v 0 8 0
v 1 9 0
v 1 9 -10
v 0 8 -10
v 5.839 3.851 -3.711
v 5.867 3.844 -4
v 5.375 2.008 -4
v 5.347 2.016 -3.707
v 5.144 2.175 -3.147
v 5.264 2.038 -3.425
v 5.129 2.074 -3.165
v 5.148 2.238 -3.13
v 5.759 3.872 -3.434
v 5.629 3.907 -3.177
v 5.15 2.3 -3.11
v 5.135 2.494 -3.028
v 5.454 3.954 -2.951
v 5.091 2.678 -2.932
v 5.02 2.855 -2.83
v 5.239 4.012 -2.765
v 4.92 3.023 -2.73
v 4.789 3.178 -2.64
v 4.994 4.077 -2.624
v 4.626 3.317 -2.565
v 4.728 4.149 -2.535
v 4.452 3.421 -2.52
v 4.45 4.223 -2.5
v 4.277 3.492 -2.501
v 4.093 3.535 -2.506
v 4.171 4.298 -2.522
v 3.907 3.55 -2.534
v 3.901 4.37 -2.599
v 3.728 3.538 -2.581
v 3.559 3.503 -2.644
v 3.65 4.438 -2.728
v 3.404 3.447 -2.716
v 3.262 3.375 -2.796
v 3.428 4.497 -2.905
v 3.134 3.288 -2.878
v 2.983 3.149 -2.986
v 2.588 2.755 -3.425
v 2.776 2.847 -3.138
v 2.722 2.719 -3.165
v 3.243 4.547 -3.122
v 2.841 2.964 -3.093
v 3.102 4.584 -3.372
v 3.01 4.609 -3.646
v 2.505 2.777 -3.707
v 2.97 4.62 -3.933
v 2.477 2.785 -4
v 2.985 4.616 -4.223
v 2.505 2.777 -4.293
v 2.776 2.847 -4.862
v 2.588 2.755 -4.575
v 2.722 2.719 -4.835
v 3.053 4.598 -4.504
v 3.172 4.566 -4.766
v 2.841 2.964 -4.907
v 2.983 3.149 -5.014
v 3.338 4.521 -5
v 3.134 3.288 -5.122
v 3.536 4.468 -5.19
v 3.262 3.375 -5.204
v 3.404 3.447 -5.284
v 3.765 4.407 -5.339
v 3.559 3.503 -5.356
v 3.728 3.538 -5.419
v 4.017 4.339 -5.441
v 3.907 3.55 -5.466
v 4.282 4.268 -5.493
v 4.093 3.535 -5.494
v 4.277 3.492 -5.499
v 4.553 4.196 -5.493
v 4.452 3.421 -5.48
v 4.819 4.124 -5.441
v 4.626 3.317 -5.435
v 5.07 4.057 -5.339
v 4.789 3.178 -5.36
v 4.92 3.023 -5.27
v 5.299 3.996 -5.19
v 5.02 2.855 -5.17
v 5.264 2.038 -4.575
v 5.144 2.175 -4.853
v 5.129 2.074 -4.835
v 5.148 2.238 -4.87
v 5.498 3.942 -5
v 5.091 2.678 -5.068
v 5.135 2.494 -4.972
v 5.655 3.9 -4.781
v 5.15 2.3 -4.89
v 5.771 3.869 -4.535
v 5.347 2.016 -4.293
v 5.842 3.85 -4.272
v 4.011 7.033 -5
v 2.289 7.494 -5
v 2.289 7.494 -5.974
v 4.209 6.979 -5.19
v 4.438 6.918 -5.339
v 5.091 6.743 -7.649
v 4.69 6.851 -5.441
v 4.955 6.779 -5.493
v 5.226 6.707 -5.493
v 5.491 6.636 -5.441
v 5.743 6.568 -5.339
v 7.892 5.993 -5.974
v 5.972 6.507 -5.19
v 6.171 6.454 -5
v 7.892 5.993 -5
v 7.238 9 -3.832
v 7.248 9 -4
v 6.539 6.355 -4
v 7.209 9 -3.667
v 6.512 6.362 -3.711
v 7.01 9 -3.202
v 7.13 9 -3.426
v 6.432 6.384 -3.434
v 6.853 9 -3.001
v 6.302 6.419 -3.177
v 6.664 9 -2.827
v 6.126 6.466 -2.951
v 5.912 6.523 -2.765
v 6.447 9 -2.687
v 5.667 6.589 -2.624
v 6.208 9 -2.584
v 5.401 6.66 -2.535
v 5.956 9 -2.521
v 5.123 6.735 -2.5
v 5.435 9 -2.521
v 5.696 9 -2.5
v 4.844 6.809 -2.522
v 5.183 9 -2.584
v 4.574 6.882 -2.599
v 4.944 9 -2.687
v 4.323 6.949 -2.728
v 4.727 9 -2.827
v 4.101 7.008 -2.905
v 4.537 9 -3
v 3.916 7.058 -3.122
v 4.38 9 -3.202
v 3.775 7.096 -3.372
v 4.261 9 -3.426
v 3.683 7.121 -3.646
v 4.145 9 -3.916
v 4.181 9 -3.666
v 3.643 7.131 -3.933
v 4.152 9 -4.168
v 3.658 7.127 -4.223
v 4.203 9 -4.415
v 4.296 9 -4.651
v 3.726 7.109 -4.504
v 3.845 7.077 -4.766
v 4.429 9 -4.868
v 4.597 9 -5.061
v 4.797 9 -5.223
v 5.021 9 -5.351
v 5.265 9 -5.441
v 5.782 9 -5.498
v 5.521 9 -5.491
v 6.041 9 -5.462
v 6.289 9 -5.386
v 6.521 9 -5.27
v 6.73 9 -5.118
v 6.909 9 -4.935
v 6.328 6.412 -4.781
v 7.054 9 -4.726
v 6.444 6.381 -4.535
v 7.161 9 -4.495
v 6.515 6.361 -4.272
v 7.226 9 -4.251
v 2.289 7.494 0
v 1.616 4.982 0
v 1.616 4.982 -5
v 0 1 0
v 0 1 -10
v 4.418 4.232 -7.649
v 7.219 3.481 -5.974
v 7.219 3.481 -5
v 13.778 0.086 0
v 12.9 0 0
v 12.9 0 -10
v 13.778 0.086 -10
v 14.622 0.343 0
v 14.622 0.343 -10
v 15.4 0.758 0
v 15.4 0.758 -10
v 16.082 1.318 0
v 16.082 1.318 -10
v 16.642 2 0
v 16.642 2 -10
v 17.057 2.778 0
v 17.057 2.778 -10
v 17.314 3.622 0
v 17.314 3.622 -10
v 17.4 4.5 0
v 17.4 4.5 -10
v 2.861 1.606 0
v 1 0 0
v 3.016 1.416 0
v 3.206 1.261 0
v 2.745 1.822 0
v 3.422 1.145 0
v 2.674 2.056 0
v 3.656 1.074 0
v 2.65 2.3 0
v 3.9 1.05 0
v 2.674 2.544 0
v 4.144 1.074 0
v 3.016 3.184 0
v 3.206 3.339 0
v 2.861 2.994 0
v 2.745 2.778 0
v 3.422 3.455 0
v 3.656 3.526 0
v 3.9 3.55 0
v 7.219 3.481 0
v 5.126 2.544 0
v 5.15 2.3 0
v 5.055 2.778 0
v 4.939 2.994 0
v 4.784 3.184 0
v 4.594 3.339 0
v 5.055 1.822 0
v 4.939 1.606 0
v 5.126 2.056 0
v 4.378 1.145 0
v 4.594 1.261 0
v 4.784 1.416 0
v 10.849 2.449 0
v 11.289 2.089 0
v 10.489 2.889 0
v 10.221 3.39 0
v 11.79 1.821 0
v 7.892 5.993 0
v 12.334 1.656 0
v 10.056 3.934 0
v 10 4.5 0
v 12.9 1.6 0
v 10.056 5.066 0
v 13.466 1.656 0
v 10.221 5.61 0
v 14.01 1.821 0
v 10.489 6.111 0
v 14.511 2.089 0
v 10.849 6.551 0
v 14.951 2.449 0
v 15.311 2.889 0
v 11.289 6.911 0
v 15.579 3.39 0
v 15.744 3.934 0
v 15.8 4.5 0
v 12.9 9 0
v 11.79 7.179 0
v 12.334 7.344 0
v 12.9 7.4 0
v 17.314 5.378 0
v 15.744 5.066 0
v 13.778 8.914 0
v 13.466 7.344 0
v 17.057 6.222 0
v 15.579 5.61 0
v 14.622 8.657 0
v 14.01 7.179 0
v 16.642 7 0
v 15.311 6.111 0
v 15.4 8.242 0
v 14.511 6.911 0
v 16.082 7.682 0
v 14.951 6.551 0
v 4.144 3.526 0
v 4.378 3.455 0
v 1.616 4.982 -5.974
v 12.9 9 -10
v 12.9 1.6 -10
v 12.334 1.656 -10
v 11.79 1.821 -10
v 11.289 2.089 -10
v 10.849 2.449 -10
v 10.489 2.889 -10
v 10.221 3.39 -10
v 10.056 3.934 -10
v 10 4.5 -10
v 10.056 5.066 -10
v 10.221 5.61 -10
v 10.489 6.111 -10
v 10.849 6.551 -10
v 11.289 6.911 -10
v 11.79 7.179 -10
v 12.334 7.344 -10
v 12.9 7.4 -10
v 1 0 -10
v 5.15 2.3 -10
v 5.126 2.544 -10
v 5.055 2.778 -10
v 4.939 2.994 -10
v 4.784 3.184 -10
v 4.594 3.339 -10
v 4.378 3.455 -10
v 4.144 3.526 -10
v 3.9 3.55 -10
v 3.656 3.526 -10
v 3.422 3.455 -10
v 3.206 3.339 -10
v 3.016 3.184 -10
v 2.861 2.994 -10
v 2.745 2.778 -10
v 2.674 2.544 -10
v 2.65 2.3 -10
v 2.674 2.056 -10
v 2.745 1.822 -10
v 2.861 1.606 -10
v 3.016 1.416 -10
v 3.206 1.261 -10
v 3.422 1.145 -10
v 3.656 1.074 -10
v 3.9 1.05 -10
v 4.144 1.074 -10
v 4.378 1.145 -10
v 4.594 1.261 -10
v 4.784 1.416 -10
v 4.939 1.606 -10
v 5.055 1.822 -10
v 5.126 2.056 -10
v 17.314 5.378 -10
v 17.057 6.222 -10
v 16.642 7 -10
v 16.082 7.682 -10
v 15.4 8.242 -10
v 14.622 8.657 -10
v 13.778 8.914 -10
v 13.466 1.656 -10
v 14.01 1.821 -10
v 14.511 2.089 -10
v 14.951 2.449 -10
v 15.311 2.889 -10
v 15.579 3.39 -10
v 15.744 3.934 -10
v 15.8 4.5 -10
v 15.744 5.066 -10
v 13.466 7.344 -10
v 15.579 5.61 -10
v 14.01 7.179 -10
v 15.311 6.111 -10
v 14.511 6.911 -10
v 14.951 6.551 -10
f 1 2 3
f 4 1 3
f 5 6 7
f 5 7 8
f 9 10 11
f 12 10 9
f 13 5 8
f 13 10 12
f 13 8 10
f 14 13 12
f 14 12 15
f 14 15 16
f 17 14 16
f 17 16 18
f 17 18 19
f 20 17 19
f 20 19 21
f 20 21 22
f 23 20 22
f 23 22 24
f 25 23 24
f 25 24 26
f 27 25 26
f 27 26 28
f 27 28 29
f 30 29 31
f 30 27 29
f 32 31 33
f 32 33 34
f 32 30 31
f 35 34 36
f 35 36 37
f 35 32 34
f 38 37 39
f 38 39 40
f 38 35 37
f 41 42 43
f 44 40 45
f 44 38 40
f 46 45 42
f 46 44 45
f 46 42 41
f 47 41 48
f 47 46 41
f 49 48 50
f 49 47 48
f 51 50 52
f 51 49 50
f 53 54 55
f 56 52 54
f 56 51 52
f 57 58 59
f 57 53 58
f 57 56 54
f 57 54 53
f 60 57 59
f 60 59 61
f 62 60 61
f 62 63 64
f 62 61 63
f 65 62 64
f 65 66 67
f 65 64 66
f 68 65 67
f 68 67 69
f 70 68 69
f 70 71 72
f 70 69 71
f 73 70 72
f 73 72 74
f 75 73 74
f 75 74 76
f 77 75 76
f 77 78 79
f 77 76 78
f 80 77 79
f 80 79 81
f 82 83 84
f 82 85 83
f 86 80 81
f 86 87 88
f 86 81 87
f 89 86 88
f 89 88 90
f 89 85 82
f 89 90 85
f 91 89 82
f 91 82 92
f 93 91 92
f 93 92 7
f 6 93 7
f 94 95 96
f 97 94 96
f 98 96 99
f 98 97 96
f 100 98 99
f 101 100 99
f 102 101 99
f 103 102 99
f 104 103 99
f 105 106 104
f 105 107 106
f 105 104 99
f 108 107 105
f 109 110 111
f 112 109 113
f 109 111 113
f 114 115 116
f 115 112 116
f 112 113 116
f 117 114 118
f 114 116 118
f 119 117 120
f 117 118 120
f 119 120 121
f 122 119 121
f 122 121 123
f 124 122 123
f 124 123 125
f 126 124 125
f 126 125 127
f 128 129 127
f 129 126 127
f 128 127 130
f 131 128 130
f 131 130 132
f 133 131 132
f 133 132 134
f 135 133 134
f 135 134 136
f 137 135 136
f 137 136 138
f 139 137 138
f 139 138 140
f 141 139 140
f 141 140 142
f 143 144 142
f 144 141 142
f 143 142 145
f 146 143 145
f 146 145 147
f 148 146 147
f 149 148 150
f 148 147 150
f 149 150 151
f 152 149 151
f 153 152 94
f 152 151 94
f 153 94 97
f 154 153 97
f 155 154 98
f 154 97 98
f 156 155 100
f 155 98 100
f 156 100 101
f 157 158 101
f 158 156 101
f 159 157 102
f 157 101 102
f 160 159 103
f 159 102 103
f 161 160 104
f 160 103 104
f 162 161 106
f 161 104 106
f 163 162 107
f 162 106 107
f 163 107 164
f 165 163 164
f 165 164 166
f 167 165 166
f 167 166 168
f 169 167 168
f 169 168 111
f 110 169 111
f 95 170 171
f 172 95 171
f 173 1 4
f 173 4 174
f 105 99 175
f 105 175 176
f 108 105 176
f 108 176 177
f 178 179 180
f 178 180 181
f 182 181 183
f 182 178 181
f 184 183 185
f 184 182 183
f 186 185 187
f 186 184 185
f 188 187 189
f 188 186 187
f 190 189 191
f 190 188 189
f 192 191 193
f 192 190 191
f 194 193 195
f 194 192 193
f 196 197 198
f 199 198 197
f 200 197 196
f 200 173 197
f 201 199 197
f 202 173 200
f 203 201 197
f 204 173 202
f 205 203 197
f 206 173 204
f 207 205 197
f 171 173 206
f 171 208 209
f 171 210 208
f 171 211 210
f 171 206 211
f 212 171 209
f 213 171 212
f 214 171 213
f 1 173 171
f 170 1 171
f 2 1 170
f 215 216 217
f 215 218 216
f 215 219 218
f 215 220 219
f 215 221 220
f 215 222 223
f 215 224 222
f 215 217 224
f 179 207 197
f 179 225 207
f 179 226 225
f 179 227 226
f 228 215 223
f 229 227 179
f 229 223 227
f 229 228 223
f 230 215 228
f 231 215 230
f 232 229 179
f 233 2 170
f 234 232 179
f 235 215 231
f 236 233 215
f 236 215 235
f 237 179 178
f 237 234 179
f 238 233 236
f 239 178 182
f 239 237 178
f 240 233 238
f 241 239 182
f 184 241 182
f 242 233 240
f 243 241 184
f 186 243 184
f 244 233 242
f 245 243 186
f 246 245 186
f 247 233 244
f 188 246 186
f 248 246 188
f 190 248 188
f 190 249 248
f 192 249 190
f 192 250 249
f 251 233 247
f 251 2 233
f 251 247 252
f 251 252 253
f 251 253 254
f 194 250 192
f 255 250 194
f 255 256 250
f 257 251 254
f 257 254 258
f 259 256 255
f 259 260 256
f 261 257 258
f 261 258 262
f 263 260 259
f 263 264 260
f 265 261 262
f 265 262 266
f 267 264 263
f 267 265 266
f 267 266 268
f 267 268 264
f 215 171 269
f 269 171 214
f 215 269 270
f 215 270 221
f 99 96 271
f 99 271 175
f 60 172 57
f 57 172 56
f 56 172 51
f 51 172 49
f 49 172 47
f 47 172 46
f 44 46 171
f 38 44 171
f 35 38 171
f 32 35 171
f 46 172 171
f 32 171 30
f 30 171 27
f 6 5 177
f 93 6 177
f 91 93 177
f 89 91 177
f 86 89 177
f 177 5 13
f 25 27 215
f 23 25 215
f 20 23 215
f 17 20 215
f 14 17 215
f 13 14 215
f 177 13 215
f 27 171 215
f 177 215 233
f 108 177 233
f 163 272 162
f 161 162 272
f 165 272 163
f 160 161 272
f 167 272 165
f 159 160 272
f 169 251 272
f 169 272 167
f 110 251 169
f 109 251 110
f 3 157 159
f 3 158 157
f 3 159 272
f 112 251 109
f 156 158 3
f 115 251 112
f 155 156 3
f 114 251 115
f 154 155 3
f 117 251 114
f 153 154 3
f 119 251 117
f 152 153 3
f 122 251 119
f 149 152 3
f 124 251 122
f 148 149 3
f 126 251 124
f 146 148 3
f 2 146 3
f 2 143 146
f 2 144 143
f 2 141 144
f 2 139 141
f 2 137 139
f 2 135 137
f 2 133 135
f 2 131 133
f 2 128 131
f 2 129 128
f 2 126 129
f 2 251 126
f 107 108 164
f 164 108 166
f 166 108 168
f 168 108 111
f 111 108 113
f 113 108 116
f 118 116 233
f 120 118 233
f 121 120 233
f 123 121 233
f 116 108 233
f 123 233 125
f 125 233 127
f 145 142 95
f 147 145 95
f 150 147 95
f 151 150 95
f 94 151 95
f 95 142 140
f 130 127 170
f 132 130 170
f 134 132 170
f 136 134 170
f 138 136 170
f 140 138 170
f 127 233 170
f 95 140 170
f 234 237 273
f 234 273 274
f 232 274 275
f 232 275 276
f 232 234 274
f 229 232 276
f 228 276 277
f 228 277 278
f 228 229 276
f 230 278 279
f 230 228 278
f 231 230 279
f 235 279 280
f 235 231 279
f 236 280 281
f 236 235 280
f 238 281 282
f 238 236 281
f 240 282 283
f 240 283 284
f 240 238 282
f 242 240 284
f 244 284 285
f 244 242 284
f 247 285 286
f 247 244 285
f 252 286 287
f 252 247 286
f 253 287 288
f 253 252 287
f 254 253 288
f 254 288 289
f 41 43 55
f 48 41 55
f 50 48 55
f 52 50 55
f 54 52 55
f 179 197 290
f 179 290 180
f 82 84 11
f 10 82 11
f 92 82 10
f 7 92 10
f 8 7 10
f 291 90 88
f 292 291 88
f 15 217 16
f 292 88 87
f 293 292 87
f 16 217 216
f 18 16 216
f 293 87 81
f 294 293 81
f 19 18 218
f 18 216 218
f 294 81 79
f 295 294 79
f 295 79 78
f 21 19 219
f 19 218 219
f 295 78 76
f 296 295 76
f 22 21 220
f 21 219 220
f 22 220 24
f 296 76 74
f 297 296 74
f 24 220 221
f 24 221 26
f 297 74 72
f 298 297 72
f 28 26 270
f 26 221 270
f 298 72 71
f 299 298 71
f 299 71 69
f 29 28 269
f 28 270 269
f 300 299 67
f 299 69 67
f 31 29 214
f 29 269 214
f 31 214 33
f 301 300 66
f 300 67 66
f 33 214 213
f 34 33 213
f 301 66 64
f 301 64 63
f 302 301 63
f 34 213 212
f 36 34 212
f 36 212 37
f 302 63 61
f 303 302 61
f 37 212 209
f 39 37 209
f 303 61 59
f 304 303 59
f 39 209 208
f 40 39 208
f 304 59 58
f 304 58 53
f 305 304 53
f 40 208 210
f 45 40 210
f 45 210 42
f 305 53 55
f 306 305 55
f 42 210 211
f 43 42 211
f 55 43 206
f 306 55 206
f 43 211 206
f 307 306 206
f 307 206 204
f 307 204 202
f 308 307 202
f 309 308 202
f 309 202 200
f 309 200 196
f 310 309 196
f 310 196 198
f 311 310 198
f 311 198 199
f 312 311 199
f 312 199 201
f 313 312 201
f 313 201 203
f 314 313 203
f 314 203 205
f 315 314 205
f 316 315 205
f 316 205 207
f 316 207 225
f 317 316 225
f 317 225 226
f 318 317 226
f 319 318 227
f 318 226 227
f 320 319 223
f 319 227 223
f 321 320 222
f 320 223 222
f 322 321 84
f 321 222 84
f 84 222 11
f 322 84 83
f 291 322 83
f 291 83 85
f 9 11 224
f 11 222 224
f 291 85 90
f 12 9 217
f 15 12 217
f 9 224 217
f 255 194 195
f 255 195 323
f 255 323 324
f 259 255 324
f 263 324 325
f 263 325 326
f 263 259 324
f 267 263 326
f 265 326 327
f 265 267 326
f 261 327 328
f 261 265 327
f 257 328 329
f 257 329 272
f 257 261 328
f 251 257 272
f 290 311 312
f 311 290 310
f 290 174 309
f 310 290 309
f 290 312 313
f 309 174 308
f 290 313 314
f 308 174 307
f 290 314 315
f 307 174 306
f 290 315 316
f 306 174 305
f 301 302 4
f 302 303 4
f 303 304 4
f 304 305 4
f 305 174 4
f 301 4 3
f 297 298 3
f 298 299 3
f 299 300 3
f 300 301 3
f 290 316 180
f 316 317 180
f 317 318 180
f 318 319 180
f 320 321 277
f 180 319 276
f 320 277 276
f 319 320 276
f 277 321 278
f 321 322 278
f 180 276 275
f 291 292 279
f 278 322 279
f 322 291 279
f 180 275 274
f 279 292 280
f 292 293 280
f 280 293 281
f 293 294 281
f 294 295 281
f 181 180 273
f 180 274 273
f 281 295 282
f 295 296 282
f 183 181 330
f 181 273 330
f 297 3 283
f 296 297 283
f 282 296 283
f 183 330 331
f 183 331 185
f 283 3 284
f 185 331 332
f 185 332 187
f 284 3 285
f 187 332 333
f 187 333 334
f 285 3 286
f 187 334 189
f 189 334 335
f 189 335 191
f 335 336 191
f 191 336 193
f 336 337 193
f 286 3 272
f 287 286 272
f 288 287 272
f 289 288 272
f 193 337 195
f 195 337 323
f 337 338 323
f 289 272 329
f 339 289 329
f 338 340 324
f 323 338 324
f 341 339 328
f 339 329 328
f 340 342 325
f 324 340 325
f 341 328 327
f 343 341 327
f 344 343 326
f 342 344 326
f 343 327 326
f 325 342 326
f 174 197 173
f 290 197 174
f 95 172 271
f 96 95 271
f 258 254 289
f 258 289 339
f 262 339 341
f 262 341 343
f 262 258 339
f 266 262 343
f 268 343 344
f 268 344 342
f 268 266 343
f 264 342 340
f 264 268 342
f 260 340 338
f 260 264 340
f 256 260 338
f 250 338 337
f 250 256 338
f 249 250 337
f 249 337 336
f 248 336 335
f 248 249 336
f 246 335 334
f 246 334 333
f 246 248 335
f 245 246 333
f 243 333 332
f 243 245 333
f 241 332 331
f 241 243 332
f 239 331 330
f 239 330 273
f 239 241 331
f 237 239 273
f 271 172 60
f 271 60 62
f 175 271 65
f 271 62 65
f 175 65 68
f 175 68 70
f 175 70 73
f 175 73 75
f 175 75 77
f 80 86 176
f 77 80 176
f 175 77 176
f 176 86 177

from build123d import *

# Parameters (mm, degrees)
F0_R     = 1.25
F1_DEPTH = 10
F3_DEPTH = 5
F5_DEPTH = 2.6
F6_R     = 1.5
F7_DEPTH = 3
F8_DEPTH = 4.5
F9_SIZE  = 1
F10_SIZE = 1


with BuildPart() as f1:
    # F0 (on Top) → F1 (new body)
    with BuildSketch(Plane.XY):
        with BuildLine():
            Line((0, 9), (0, 0))
            Line((0, 0), (12.9, 0))
            ThreePointArc((12.9, 0), (8.4, 4.5), (12.9, 9))
            Line((12.9, 9), (0, 9))
        make_face()
        with Locations((3.9, 2.3)):
            Circle(F0_R, mode=Mode.SUBTRACT)
        with BuildLine():
            ThreePointArc((12.9, 9), (8.4, 4.5), (12.9, 0))
            Line((12.9, 0), (12.9, 1.6))
            ThreePointArc((12.9, 1.6), (10, 4.5), (12.9, 7.4))
            Line((12.9, 7.4), (12.9, 9))
        make_face()
        with BuildLine():
            Line((12.9, 1.6), (12.9, 0))
            ThreePointArc((12.9, 0), (16.0819805153, 1.3180194847), (17.4, 4.5))
            ThreePointArc((17.4, 4.5), (16.0819805153, 7.6819805153), (12.9, 9))
            Line((12.9, 9), (12.9, 7.4))
            ThreePointArc((12.9, 7.4), (14.9506096654, 6.5506096654), (15.8, 4.5))
            ThreePointArc((15.8, 4.5), (14.9506096654, 2.4493903346), (12.9, 1.6))
        make_face()
    extrude(amount=-F1_DEPTH)

    # F2 (on face) → F3 (cut)
    with BuildSketch(Plane.XY):
        Polygon((7.8917525037, 5.9926835701), (2.2893827112, 7.4938340317), (1.616453194, 4.9824268834), (7.2188229864, 3.4812764218), align=None)
    extrude(amount=-F3_DEPTH, mode=Mode.SUBTRACT)

    # F4 (on face) → F5 (cut, through all)
    with BuildSketch(Plane(origin=(2.0268180701, 7.5641880153, 0), x_dir=(0.9659258263, -0.2588190451, 0), z_dir=(-0.2588190451, -0.9659258263, 0))):
        Polygon((6.0718269188, -5.9743157806), (6.0718269188, -2.6256842194), (3.1718269188, -0.9513684387), (0.2718269188, -2.6256842194), (0.2718269188, -5.9743157806), (3.1718269188, -7.6486315613), align=None)
    extrude(amount=F5_DEPTH, mode=Mode.SUBTRACT)

    # F6 (on face) → F7 (cut)
    with BuildSketch(Plane(origin=(2.0268180701, 7.5641880153, 0), x_dir=(0.9659258263, -0.2588190451, 0), z_dir=(-0.2588190451, -0.9659258263, 0))):
        with Locations((3.1718269188, -4)):
            Circle(F6_R)
    extrude(amount=-F7_DEPTH, mode=Mode.SUBTRACT)

    # F6 (on face) → F8 (cut)
    with BuildSketch(Plane(origin=(2.0268180701, 7.5641880153, 0), x_dir=(0.9659258263, -0.2588190451, 0), z_dir=(-0.2588190451, -0.9659258263, 0))):
        with Locations((3.1718269188, -4)):
            Circle(F6_R)
    extrude(amount=F8_DEPTH, mode=Mode.SUBTRACT)

    # F9
    f9_edges = [f1.edges().sort_by_distance(p)[0] for p in [
        (0, 0, -5),
    ]]
    chamfer(f9_edges, length=F9_SIZE)

    # F10
    f10_edges = [f1.edges().sort_by_distance(p)[0] for p in [
        (0, 9, -5),
    ]]
    chamfer(f10_edges, length=F10_SIZE)


solid = f1.part
